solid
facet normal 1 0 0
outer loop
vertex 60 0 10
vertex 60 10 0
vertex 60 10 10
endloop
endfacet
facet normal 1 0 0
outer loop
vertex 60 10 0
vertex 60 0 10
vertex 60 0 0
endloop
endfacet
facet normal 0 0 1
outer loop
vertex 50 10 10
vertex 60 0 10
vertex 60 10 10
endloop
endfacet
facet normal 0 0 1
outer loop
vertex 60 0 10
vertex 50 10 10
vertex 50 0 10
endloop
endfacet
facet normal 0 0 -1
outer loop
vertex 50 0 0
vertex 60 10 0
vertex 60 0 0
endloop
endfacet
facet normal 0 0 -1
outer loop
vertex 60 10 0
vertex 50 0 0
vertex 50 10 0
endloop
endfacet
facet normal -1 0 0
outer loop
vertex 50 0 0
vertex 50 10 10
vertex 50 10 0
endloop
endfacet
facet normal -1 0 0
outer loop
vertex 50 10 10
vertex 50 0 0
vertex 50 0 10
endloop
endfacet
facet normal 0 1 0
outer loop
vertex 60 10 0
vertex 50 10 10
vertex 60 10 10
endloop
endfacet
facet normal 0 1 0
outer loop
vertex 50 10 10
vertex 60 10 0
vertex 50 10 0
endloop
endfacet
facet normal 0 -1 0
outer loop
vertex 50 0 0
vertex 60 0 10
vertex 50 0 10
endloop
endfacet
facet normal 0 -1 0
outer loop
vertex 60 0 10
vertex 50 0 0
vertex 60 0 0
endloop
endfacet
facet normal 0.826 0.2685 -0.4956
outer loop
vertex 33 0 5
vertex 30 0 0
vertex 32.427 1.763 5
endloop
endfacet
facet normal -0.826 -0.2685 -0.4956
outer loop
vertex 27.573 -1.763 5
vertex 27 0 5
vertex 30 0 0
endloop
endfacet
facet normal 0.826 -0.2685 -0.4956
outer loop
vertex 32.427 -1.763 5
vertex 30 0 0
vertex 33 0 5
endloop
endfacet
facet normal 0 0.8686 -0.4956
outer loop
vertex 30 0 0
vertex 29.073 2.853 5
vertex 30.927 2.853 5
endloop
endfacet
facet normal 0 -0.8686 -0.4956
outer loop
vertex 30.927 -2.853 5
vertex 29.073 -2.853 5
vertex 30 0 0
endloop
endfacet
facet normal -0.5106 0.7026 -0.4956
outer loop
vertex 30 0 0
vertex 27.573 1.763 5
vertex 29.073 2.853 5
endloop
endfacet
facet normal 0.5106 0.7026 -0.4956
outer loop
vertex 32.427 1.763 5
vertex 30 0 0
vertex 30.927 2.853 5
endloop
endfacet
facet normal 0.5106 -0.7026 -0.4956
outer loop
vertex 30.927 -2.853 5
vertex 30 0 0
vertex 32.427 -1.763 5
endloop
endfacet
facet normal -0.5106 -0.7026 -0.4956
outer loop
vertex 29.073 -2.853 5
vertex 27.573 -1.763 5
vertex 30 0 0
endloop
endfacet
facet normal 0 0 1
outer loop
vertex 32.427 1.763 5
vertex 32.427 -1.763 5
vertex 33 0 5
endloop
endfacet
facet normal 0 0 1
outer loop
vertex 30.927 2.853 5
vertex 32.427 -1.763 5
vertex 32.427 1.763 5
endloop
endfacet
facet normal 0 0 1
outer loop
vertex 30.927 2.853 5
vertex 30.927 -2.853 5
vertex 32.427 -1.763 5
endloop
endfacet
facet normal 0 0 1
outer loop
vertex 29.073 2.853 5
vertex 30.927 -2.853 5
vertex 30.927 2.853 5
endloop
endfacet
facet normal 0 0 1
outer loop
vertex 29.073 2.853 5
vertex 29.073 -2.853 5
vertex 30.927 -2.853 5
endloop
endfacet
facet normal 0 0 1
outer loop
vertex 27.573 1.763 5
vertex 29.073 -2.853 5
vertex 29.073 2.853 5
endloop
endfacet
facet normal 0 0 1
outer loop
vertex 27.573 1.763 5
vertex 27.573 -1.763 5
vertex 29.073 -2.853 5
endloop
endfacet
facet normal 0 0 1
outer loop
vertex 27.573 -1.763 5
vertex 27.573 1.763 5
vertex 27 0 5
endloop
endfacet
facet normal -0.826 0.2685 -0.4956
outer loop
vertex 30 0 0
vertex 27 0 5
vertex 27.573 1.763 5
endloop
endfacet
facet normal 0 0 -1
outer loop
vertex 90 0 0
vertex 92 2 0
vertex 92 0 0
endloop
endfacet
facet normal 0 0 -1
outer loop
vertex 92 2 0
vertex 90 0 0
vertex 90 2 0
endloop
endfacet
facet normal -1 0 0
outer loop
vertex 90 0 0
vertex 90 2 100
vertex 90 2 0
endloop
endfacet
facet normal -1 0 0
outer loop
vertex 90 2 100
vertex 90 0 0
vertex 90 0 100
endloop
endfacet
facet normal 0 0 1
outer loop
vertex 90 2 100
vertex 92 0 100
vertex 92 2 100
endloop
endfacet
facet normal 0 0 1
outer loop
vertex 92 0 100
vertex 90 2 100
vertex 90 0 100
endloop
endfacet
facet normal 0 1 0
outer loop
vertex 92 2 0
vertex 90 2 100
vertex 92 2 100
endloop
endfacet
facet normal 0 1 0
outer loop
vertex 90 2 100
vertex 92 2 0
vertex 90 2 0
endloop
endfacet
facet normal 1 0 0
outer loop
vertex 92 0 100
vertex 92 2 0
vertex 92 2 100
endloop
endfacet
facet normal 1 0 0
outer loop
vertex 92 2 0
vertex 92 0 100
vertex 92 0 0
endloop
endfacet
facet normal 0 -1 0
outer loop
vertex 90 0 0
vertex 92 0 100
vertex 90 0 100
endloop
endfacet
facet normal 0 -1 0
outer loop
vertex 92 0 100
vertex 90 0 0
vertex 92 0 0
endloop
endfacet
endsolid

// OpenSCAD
// A non-positive dimension yields no geometry, as upstream. Every primitive
// below contributes nothing, so only the valid cube and cone remain. Emitting
// degenerate geometry instead is not merely zero-volume: those triangles are
// non-manifold and take the enclosing boolean down with them.
cube([-2,3,4]);
cube(-5);
cube(0);
cube([0,3,4]);
sphere(-5);
sphere(0);
cylinder(h=-5, r=2);
cylinder(h=0, r=2);
cylinder(h=5, r=-2);
cylinder(h=5, r=0);
cylinder(h=5, r1=-1, r2=3);
cylinder(h=5, r1=0, r2=0);
linear_extrude(height=-5) square(2);
linear_extrude(height=0) square(2);
linear_extrude(1) square([-2,3]);
linear_extrude(1) square(0);
linear_extrude(1) circle(-5);

// Still valid: one radius may be zero, which is a cone.
translate([30,0,0]) cylinder(h=5, r1=0, r2=3);
// And a degenerate operand must not break a boolean.
translate([50,0,0]) difference() { cube(10); cube(0); }

// NaN and infinity are invalid dimensions for primitives...
translate([70,0,0]) { cube(0/0); cube(1/0); sphere(0/0); cylinder(h=1/0,r=2); }
// ...but for linear_extrude a non-finite height counts as *unset*, so it falls
// back to the default of 100 rather than extruding nothing.
translate([90,0,0]) linear_extrude(height=1/0) square(2);
